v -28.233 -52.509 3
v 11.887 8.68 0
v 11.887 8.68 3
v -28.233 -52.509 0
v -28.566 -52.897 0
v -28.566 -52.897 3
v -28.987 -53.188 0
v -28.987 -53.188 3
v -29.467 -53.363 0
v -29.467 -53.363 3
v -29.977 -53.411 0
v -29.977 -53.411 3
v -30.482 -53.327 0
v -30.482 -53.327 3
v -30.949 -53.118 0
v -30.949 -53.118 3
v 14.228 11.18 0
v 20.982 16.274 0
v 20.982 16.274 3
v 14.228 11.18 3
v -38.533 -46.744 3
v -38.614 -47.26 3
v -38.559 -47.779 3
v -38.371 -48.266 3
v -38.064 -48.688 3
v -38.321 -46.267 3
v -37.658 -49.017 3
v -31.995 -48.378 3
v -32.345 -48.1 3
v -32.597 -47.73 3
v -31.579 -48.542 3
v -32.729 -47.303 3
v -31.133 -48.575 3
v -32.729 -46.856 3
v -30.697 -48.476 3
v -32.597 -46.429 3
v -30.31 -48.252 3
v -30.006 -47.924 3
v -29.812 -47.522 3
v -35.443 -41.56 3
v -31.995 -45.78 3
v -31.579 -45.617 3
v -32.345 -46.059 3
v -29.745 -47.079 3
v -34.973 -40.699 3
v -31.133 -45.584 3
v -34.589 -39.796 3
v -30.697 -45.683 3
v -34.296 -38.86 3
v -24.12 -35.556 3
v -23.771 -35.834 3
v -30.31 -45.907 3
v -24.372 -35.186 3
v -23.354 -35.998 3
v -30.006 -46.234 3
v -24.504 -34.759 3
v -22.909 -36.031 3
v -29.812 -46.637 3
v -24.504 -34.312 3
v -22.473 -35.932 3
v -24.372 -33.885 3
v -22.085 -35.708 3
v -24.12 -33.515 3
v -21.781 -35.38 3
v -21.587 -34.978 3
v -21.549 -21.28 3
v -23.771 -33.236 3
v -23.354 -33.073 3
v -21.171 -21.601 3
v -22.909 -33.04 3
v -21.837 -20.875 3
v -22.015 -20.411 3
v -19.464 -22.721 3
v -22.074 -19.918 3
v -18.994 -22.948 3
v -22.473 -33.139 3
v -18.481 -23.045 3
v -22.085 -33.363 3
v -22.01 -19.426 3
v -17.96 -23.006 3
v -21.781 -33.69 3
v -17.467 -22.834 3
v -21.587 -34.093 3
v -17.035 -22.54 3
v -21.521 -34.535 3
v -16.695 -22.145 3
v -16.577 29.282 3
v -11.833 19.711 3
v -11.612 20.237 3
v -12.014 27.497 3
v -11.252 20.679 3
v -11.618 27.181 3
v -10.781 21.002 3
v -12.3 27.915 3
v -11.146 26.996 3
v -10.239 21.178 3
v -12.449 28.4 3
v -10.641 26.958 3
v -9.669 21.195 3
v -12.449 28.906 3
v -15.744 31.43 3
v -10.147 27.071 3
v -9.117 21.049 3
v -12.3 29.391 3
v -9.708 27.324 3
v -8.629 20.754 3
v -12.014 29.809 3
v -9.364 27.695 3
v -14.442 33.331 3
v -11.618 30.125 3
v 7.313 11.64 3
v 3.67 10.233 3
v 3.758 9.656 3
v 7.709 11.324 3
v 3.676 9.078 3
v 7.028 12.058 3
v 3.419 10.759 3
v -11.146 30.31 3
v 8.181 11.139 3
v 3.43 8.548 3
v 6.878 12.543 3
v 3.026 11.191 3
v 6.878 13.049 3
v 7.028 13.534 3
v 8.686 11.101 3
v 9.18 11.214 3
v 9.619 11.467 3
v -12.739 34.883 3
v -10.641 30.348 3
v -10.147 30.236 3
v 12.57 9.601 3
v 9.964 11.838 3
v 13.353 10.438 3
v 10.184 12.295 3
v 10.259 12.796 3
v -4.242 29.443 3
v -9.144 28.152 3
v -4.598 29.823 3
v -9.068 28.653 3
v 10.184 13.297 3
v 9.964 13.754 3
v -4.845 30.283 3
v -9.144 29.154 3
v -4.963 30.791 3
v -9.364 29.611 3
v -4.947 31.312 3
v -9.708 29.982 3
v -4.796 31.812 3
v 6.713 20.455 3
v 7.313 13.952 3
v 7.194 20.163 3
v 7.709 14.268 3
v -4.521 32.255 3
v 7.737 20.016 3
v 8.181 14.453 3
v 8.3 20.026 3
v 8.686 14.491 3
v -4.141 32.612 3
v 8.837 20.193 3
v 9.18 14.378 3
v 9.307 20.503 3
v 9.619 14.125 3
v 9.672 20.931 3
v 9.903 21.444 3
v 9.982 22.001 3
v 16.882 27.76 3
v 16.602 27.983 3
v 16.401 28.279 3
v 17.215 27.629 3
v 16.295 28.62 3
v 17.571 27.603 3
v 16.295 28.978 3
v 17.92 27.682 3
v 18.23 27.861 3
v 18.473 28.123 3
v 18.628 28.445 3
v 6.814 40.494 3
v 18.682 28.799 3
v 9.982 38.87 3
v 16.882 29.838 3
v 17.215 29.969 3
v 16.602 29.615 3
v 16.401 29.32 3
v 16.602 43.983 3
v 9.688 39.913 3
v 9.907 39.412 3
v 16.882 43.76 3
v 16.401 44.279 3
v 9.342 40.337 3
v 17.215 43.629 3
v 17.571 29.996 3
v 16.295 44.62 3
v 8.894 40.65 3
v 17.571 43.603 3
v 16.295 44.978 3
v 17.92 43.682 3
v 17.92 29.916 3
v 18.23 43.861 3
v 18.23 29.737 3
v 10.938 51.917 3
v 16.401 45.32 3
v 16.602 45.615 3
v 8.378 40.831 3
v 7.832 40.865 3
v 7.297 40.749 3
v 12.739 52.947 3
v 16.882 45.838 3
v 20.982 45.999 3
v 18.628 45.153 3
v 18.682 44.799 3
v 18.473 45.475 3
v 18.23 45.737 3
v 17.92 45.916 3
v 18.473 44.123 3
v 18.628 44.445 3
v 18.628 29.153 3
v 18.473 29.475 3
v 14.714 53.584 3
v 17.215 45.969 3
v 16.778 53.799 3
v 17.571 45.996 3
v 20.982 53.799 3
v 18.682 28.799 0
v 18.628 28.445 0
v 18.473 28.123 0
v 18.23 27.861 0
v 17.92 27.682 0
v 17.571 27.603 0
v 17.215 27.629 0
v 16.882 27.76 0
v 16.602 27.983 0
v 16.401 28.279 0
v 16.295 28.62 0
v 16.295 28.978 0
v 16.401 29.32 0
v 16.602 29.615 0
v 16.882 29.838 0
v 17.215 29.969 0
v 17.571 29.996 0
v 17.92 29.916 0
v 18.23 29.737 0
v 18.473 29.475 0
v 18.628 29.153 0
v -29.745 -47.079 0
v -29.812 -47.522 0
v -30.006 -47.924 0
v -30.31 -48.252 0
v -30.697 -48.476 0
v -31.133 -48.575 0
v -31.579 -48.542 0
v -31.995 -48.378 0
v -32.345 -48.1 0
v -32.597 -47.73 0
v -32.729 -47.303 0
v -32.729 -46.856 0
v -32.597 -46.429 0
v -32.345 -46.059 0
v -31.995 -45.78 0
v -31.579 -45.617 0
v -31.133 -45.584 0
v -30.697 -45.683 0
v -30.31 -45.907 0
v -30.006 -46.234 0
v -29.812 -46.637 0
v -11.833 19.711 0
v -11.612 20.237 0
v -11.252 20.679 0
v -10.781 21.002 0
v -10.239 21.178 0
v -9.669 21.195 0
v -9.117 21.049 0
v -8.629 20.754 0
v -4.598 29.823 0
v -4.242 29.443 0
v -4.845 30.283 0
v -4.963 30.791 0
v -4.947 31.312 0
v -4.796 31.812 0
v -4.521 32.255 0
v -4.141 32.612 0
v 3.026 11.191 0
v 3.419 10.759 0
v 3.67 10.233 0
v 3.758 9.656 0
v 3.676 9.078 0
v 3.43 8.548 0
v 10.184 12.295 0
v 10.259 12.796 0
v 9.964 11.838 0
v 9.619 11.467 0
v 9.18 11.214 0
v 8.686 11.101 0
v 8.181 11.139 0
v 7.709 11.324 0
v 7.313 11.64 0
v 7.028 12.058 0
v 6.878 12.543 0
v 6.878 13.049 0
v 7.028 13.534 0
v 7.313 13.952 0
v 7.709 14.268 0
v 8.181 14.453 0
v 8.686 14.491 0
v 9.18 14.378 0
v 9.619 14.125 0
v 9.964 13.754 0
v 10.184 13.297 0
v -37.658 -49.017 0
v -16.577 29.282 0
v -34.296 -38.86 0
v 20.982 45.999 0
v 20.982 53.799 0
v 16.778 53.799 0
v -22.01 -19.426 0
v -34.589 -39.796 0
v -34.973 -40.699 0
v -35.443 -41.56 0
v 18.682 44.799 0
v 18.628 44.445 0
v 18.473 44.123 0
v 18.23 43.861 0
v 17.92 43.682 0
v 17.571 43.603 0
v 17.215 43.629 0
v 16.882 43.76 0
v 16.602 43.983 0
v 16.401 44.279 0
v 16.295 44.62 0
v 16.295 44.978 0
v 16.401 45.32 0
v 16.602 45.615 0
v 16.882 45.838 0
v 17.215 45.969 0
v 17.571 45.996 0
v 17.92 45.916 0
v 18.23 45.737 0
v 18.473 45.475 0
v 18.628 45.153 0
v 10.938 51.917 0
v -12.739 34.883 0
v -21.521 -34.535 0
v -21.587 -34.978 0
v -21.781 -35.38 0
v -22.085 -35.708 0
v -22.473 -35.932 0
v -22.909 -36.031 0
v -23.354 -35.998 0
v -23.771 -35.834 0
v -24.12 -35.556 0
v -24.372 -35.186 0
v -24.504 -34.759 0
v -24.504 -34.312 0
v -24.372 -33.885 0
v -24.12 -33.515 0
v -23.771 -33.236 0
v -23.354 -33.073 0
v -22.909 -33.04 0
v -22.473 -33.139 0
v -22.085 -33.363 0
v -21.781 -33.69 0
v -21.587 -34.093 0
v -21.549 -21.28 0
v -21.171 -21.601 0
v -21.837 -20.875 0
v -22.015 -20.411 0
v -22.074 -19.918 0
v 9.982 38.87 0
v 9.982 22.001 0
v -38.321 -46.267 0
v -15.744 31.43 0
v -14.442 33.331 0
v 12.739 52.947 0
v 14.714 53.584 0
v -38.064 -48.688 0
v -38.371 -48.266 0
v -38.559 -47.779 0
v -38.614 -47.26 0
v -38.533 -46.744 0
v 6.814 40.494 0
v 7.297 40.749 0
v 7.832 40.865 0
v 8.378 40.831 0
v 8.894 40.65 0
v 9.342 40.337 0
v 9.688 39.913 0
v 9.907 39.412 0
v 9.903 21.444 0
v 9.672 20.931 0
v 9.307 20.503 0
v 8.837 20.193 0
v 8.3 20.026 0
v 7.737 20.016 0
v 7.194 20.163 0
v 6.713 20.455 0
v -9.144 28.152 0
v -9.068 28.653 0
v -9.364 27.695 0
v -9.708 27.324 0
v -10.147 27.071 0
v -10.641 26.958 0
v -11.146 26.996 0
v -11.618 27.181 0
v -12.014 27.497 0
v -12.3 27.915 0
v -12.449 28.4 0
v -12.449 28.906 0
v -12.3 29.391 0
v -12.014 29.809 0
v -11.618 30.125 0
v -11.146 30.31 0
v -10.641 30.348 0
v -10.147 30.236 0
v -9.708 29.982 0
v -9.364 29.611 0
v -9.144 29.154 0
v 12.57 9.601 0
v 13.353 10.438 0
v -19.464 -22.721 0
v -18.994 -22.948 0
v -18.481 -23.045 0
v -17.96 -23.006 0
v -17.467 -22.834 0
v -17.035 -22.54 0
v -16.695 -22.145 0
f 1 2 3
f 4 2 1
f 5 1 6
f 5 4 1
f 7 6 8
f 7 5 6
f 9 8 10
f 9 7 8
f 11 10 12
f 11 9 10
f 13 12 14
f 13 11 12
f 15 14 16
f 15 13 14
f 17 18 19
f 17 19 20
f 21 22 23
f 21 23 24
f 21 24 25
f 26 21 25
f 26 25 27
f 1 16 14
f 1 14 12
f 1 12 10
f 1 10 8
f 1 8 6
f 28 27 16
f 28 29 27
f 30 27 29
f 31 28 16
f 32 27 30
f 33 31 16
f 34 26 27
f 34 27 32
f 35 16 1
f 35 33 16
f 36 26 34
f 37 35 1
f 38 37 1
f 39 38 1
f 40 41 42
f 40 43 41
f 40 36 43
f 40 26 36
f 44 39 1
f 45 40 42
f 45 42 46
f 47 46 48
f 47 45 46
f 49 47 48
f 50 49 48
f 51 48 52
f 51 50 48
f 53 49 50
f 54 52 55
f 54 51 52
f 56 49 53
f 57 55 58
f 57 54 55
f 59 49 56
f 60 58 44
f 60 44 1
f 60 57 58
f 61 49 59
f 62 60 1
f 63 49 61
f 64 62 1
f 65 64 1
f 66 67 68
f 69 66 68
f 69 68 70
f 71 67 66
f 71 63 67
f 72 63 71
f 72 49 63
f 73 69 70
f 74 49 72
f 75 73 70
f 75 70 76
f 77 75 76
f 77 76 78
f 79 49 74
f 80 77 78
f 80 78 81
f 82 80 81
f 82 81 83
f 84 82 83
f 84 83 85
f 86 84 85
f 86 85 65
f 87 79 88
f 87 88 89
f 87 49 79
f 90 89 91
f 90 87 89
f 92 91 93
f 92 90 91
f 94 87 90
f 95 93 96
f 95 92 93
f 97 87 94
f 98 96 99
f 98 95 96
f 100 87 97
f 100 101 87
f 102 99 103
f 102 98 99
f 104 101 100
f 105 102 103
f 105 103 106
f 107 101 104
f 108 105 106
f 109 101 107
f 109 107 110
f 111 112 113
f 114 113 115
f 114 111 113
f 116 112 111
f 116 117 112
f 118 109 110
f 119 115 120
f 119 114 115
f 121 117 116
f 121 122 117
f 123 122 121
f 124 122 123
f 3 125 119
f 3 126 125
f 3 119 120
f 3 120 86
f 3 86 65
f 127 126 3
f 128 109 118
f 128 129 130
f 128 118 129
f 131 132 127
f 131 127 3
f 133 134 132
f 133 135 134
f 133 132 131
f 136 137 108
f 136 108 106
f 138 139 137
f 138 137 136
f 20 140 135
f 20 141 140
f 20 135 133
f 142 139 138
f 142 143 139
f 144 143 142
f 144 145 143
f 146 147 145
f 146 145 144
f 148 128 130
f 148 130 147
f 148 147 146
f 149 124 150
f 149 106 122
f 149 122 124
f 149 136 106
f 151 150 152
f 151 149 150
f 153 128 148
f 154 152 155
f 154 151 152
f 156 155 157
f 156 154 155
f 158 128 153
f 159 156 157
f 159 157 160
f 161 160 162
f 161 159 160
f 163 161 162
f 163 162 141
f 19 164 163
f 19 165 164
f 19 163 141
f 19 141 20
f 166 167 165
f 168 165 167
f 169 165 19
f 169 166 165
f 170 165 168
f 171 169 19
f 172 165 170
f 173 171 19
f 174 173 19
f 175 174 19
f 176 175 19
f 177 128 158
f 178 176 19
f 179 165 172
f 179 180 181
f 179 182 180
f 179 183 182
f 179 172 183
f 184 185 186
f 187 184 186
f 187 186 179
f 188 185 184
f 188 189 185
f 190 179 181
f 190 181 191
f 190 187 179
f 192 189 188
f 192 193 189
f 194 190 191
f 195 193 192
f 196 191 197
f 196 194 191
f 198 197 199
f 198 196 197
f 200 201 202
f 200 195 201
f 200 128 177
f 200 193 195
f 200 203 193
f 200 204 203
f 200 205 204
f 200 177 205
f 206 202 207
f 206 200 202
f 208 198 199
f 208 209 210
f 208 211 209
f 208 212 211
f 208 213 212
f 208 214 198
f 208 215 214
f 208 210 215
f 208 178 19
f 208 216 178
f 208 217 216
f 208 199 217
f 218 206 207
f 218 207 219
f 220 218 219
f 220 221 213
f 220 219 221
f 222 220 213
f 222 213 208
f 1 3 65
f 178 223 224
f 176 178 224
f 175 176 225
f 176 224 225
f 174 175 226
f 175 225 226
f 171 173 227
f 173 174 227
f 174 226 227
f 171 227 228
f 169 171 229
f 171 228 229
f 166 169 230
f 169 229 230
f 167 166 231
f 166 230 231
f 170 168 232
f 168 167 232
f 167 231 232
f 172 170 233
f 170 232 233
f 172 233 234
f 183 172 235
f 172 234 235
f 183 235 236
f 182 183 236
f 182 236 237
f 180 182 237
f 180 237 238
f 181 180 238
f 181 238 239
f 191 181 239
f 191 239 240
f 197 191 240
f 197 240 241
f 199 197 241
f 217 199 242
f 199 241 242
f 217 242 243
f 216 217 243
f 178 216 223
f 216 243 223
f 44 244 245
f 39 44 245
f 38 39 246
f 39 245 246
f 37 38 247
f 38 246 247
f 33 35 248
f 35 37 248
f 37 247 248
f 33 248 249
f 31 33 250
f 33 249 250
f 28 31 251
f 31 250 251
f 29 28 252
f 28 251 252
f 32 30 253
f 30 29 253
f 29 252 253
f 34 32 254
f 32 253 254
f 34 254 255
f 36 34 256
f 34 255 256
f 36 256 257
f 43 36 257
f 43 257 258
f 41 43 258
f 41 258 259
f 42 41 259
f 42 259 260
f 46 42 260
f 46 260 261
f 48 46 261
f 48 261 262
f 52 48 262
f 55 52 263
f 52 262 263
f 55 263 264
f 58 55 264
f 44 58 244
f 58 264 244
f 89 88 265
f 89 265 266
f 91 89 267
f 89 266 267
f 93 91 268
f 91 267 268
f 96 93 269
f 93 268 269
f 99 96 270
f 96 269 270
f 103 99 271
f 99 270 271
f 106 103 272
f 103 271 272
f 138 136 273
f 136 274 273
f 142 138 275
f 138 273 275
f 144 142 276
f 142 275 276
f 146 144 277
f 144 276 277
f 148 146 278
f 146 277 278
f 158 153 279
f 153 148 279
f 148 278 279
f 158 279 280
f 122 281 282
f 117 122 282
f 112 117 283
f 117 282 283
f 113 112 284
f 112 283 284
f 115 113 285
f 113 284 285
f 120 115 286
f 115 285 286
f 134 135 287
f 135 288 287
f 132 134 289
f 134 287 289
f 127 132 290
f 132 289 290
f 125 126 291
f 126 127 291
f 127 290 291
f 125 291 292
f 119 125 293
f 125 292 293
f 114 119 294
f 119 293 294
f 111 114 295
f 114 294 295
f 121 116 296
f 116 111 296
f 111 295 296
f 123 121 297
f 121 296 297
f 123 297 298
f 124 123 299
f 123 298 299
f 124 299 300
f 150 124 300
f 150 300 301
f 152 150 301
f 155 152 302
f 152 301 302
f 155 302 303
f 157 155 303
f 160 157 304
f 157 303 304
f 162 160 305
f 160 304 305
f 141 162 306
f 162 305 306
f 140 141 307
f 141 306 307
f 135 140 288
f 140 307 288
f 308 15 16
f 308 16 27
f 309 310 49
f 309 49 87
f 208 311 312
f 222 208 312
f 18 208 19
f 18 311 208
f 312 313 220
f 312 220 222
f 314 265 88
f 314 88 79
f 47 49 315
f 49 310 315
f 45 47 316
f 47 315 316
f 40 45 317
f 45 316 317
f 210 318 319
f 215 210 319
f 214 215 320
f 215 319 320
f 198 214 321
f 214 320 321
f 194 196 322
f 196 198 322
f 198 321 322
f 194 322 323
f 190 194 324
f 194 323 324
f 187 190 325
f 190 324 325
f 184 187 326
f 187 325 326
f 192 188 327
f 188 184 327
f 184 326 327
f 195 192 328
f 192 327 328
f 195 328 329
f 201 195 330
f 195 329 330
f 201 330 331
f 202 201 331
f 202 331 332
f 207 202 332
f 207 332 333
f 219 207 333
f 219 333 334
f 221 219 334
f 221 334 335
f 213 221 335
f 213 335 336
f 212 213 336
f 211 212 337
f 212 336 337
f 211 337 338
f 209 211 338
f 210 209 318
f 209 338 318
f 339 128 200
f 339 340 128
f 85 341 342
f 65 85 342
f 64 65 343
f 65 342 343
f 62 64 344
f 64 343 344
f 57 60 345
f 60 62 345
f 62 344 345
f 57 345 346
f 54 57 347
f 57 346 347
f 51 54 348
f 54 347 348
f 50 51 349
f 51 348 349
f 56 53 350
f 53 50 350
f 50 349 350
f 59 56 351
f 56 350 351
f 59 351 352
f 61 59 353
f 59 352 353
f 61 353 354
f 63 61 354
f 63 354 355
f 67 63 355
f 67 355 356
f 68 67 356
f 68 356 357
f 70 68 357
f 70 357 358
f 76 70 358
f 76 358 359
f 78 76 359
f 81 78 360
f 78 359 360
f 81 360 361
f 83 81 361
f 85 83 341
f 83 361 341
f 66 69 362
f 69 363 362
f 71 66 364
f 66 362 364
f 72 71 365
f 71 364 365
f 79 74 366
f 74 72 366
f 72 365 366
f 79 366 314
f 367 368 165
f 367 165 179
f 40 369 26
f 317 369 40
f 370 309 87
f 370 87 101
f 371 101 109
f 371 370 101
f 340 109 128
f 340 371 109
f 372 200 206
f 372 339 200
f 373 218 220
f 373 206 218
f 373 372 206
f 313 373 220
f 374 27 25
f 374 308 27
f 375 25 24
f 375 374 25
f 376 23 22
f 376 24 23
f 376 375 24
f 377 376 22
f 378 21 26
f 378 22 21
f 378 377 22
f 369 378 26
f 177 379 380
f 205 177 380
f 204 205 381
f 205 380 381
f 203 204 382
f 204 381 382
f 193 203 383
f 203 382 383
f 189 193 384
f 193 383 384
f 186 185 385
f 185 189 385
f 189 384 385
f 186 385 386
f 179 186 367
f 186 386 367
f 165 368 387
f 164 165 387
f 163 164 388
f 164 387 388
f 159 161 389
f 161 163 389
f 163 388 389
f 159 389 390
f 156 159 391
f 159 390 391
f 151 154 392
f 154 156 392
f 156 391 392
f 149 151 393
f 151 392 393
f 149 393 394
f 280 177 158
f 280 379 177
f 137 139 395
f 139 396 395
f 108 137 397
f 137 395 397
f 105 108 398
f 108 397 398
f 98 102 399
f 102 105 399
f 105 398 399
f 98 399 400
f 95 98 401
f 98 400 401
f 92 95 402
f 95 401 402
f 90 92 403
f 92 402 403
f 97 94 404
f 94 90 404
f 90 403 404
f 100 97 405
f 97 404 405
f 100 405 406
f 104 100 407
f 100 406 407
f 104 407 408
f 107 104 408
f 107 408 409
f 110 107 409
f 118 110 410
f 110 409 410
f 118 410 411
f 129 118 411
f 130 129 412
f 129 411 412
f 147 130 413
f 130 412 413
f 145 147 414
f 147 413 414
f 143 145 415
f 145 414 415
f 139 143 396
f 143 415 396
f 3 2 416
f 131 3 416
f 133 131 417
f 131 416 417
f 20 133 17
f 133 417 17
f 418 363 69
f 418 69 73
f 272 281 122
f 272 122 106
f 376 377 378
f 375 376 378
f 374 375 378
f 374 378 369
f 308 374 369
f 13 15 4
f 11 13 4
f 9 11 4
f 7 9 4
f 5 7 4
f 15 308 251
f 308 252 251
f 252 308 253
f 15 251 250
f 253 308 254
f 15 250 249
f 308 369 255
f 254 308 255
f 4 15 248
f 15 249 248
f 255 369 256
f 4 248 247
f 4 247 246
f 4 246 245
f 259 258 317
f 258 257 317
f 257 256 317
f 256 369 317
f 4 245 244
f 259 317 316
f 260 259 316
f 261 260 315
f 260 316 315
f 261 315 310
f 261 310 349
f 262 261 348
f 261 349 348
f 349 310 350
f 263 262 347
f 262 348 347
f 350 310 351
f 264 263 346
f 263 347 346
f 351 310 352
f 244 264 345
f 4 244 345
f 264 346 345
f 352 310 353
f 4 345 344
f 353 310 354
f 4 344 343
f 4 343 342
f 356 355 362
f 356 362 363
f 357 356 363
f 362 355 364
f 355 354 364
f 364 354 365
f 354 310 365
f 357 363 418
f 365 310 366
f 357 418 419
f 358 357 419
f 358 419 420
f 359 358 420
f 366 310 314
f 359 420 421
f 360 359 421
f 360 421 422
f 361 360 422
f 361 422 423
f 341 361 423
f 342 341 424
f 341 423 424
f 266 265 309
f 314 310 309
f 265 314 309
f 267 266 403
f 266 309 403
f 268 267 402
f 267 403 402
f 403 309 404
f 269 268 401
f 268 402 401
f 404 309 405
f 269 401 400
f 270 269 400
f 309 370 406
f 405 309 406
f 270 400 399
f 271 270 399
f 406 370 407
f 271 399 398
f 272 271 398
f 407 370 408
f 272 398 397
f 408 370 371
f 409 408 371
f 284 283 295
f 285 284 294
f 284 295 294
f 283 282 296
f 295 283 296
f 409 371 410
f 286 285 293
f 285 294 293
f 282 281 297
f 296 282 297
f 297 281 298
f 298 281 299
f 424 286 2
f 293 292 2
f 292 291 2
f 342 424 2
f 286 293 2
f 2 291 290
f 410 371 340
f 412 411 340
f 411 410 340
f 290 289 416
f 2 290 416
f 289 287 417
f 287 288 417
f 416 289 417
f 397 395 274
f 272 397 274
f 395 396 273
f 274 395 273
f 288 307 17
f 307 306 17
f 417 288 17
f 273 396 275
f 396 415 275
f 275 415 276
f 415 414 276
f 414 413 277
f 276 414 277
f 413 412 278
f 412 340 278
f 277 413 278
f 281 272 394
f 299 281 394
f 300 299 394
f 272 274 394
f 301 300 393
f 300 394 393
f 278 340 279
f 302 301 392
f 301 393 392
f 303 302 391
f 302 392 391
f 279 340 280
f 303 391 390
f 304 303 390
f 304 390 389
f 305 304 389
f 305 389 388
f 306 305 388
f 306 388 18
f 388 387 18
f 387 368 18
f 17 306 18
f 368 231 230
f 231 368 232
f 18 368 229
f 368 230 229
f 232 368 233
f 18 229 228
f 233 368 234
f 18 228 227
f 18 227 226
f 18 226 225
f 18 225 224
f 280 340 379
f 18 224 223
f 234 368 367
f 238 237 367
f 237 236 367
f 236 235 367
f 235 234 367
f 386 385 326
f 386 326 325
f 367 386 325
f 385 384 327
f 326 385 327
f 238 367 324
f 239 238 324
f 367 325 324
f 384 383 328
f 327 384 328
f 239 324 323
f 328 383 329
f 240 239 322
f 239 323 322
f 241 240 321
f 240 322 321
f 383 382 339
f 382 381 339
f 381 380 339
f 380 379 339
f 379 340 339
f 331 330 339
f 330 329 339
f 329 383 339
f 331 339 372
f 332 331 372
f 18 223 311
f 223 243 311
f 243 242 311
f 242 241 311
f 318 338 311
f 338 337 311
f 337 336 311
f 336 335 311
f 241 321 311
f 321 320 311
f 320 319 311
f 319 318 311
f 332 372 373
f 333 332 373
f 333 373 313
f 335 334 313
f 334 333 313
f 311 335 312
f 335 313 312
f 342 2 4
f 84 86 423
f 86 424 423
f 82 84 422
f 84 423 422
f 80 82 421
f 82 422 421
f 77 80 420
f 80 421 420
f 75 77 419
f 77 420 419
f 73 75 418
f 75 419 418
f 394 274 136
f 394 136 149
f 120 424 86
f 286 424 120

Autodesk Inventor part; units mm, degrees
ref_plane "YZ Plane" through (0, 0, 0) normal (1, 0, 0) x (0, 1, 0)
ref_plane "XZ Plane" through (0, 0, 0) normal (0, 1, 0) x (-1, 0, 0)
ref_plane "XY Plane" through (0, 0, 0) normal (0, 0, 1) x (1, 0, 0)
sketch "Sketch1" plane through (0, 0, 0) normal (0, 0, 1) x (1, 0, 0)
  circle A0 centre (-10.7682, 28.6531) radius 1.7
  line L0 (-30.9487, -53.1184) -> (-37.6576, -49.0166)
  arc A1 (-38.3208, -46.2671) -> (-37.6576, -49.0166) centre (-36.6144, -47.3103) ccw
  line L1 (-38.3208, -46.2671) -> (-35.4427, -41.5596)
  arc A2 (-35.4427, -41.5596) -> (-34.2964, -38.8601) centre (-43.9745, -36.3434) ccw
  line L2 (-34.2964, -38.8601) -> (-16.5771, 29.2821)
  arc A3 (-12.739, 34.883) -> (-16.5771, 29.2821) centre (-6.899, 26.7655) ccw
  line L3 (-12.739, 34.883) -> (10.9377, 51.9167)
  arc A4 (16.7777, 53.7992) -> (10.9377, 51.9167) centre (16.7777, 43.7992) ccw
  line L4 (16.7777, 53.7992) -> (20.9818, 53.7992)
  line L5 (20.9818, 45.9992) -> (20.9818, 16.274)
  line L6 (20.9818, 16.274) -> (14.228, 11.1802)
  arc A5 (14.228, 11.1802) -> (11.8867, 8.6795) centre (20.2494, 3.1963) ccw
  line L7 (11.8867, 8.6795) -> (-28.2329, -52.5086)
  arc A6 (-4.1413, 32.6124) -> (-4.2418, 29.4427) centre (-2.9733, 30.9889) ccw
  line L8 (-4.2418, 29.4427) -> (6.7132, 20.4547)
  arc A7 (6.7132, 20.4547) -> (9.9818, 22.0009) centre (7.9818, 22.0009) ccw
  line L9 (9.9818, 22.0009) -> (9.9818, 38.8703)
  arc A8 (9.9818, 38.8703) -> (6.8138, 40.4938) centre (7.9818, 38.8703) ccw
  line L10 (6.8138, 40.4938) -> (-4.1413, 32.6124)
  circle A9 centre (17.4818, 44.7992) radius 1.2
  circle A10 centre (17.4818, 28.7992) radius 1.2
  line L11 (-16.6946, -22.1449) -> (3.4303, 8.5485)
  arc A11 (3.4303, 8.5485) -> (3.0263, 11.1914) centre (1.7578, 9.6452) ccw
  line L12 (3.0263, 11.1914) -> (-8.6289, 20.7539)
  arc A12 (-8.6289, 20.7539) -> (-11.8331, 19.711) centre (-9.8975, 19.2077) ccw
  line L13 (-11.8331, 19.711) -> (-22.01, -19.4256)
  arc A13 (-22.01, -19.4256) -> (-21.171, -21.6014) centre (-20.0743, -19.9289) ccw
  line L14 (-21.171, -21.6014) -> (-19.4638, -22.7208)
  arc A14 (-19.4638, -22.7208) -> (-16.6946, -22.1449) centre (-18.3672, -21.0482) ccw
  line L15 (20.9818, 45.9992) -> (20.9818, 53.7992)
  circle A15 centre (-31.2454, -47.0794) radius 1.5
  circle A16 centre (-23.0206, -34.5354) radius 1.5
  line L16 (-23.0206, -34.5354) -> (-31.2454, -47.0794) construction
  line L17 (-31.2454, -47.0794) -> (-33.987, -51.2608) construction
  arc A17 (-30.9487, -53.1184) -> (-28.2329, -52.5086) centre (-29.9054, -51.412) ccw
  circle A18 centre (8.5593, 12.796) radius 1.7
  line L18 (-10.7682, 28.6531) -> (8.5593, 12.796) construction
  point P0 (0, 0)
  point P1 (-30.3165, -53.5049)
  point P2 (-11.731, -27.3408)
  dimension "d2" = 3
  dimension "d3" = 3
  dimension "d5" = 2
  dimension "d6" = 5
  dimension "d7" = 15
  dimension "d8" = 3.4
  dimension "d9" = 25
extrude "Extrusion1" add sketch "Sketch1" along normal blind 3
properties part number "Tibia"
